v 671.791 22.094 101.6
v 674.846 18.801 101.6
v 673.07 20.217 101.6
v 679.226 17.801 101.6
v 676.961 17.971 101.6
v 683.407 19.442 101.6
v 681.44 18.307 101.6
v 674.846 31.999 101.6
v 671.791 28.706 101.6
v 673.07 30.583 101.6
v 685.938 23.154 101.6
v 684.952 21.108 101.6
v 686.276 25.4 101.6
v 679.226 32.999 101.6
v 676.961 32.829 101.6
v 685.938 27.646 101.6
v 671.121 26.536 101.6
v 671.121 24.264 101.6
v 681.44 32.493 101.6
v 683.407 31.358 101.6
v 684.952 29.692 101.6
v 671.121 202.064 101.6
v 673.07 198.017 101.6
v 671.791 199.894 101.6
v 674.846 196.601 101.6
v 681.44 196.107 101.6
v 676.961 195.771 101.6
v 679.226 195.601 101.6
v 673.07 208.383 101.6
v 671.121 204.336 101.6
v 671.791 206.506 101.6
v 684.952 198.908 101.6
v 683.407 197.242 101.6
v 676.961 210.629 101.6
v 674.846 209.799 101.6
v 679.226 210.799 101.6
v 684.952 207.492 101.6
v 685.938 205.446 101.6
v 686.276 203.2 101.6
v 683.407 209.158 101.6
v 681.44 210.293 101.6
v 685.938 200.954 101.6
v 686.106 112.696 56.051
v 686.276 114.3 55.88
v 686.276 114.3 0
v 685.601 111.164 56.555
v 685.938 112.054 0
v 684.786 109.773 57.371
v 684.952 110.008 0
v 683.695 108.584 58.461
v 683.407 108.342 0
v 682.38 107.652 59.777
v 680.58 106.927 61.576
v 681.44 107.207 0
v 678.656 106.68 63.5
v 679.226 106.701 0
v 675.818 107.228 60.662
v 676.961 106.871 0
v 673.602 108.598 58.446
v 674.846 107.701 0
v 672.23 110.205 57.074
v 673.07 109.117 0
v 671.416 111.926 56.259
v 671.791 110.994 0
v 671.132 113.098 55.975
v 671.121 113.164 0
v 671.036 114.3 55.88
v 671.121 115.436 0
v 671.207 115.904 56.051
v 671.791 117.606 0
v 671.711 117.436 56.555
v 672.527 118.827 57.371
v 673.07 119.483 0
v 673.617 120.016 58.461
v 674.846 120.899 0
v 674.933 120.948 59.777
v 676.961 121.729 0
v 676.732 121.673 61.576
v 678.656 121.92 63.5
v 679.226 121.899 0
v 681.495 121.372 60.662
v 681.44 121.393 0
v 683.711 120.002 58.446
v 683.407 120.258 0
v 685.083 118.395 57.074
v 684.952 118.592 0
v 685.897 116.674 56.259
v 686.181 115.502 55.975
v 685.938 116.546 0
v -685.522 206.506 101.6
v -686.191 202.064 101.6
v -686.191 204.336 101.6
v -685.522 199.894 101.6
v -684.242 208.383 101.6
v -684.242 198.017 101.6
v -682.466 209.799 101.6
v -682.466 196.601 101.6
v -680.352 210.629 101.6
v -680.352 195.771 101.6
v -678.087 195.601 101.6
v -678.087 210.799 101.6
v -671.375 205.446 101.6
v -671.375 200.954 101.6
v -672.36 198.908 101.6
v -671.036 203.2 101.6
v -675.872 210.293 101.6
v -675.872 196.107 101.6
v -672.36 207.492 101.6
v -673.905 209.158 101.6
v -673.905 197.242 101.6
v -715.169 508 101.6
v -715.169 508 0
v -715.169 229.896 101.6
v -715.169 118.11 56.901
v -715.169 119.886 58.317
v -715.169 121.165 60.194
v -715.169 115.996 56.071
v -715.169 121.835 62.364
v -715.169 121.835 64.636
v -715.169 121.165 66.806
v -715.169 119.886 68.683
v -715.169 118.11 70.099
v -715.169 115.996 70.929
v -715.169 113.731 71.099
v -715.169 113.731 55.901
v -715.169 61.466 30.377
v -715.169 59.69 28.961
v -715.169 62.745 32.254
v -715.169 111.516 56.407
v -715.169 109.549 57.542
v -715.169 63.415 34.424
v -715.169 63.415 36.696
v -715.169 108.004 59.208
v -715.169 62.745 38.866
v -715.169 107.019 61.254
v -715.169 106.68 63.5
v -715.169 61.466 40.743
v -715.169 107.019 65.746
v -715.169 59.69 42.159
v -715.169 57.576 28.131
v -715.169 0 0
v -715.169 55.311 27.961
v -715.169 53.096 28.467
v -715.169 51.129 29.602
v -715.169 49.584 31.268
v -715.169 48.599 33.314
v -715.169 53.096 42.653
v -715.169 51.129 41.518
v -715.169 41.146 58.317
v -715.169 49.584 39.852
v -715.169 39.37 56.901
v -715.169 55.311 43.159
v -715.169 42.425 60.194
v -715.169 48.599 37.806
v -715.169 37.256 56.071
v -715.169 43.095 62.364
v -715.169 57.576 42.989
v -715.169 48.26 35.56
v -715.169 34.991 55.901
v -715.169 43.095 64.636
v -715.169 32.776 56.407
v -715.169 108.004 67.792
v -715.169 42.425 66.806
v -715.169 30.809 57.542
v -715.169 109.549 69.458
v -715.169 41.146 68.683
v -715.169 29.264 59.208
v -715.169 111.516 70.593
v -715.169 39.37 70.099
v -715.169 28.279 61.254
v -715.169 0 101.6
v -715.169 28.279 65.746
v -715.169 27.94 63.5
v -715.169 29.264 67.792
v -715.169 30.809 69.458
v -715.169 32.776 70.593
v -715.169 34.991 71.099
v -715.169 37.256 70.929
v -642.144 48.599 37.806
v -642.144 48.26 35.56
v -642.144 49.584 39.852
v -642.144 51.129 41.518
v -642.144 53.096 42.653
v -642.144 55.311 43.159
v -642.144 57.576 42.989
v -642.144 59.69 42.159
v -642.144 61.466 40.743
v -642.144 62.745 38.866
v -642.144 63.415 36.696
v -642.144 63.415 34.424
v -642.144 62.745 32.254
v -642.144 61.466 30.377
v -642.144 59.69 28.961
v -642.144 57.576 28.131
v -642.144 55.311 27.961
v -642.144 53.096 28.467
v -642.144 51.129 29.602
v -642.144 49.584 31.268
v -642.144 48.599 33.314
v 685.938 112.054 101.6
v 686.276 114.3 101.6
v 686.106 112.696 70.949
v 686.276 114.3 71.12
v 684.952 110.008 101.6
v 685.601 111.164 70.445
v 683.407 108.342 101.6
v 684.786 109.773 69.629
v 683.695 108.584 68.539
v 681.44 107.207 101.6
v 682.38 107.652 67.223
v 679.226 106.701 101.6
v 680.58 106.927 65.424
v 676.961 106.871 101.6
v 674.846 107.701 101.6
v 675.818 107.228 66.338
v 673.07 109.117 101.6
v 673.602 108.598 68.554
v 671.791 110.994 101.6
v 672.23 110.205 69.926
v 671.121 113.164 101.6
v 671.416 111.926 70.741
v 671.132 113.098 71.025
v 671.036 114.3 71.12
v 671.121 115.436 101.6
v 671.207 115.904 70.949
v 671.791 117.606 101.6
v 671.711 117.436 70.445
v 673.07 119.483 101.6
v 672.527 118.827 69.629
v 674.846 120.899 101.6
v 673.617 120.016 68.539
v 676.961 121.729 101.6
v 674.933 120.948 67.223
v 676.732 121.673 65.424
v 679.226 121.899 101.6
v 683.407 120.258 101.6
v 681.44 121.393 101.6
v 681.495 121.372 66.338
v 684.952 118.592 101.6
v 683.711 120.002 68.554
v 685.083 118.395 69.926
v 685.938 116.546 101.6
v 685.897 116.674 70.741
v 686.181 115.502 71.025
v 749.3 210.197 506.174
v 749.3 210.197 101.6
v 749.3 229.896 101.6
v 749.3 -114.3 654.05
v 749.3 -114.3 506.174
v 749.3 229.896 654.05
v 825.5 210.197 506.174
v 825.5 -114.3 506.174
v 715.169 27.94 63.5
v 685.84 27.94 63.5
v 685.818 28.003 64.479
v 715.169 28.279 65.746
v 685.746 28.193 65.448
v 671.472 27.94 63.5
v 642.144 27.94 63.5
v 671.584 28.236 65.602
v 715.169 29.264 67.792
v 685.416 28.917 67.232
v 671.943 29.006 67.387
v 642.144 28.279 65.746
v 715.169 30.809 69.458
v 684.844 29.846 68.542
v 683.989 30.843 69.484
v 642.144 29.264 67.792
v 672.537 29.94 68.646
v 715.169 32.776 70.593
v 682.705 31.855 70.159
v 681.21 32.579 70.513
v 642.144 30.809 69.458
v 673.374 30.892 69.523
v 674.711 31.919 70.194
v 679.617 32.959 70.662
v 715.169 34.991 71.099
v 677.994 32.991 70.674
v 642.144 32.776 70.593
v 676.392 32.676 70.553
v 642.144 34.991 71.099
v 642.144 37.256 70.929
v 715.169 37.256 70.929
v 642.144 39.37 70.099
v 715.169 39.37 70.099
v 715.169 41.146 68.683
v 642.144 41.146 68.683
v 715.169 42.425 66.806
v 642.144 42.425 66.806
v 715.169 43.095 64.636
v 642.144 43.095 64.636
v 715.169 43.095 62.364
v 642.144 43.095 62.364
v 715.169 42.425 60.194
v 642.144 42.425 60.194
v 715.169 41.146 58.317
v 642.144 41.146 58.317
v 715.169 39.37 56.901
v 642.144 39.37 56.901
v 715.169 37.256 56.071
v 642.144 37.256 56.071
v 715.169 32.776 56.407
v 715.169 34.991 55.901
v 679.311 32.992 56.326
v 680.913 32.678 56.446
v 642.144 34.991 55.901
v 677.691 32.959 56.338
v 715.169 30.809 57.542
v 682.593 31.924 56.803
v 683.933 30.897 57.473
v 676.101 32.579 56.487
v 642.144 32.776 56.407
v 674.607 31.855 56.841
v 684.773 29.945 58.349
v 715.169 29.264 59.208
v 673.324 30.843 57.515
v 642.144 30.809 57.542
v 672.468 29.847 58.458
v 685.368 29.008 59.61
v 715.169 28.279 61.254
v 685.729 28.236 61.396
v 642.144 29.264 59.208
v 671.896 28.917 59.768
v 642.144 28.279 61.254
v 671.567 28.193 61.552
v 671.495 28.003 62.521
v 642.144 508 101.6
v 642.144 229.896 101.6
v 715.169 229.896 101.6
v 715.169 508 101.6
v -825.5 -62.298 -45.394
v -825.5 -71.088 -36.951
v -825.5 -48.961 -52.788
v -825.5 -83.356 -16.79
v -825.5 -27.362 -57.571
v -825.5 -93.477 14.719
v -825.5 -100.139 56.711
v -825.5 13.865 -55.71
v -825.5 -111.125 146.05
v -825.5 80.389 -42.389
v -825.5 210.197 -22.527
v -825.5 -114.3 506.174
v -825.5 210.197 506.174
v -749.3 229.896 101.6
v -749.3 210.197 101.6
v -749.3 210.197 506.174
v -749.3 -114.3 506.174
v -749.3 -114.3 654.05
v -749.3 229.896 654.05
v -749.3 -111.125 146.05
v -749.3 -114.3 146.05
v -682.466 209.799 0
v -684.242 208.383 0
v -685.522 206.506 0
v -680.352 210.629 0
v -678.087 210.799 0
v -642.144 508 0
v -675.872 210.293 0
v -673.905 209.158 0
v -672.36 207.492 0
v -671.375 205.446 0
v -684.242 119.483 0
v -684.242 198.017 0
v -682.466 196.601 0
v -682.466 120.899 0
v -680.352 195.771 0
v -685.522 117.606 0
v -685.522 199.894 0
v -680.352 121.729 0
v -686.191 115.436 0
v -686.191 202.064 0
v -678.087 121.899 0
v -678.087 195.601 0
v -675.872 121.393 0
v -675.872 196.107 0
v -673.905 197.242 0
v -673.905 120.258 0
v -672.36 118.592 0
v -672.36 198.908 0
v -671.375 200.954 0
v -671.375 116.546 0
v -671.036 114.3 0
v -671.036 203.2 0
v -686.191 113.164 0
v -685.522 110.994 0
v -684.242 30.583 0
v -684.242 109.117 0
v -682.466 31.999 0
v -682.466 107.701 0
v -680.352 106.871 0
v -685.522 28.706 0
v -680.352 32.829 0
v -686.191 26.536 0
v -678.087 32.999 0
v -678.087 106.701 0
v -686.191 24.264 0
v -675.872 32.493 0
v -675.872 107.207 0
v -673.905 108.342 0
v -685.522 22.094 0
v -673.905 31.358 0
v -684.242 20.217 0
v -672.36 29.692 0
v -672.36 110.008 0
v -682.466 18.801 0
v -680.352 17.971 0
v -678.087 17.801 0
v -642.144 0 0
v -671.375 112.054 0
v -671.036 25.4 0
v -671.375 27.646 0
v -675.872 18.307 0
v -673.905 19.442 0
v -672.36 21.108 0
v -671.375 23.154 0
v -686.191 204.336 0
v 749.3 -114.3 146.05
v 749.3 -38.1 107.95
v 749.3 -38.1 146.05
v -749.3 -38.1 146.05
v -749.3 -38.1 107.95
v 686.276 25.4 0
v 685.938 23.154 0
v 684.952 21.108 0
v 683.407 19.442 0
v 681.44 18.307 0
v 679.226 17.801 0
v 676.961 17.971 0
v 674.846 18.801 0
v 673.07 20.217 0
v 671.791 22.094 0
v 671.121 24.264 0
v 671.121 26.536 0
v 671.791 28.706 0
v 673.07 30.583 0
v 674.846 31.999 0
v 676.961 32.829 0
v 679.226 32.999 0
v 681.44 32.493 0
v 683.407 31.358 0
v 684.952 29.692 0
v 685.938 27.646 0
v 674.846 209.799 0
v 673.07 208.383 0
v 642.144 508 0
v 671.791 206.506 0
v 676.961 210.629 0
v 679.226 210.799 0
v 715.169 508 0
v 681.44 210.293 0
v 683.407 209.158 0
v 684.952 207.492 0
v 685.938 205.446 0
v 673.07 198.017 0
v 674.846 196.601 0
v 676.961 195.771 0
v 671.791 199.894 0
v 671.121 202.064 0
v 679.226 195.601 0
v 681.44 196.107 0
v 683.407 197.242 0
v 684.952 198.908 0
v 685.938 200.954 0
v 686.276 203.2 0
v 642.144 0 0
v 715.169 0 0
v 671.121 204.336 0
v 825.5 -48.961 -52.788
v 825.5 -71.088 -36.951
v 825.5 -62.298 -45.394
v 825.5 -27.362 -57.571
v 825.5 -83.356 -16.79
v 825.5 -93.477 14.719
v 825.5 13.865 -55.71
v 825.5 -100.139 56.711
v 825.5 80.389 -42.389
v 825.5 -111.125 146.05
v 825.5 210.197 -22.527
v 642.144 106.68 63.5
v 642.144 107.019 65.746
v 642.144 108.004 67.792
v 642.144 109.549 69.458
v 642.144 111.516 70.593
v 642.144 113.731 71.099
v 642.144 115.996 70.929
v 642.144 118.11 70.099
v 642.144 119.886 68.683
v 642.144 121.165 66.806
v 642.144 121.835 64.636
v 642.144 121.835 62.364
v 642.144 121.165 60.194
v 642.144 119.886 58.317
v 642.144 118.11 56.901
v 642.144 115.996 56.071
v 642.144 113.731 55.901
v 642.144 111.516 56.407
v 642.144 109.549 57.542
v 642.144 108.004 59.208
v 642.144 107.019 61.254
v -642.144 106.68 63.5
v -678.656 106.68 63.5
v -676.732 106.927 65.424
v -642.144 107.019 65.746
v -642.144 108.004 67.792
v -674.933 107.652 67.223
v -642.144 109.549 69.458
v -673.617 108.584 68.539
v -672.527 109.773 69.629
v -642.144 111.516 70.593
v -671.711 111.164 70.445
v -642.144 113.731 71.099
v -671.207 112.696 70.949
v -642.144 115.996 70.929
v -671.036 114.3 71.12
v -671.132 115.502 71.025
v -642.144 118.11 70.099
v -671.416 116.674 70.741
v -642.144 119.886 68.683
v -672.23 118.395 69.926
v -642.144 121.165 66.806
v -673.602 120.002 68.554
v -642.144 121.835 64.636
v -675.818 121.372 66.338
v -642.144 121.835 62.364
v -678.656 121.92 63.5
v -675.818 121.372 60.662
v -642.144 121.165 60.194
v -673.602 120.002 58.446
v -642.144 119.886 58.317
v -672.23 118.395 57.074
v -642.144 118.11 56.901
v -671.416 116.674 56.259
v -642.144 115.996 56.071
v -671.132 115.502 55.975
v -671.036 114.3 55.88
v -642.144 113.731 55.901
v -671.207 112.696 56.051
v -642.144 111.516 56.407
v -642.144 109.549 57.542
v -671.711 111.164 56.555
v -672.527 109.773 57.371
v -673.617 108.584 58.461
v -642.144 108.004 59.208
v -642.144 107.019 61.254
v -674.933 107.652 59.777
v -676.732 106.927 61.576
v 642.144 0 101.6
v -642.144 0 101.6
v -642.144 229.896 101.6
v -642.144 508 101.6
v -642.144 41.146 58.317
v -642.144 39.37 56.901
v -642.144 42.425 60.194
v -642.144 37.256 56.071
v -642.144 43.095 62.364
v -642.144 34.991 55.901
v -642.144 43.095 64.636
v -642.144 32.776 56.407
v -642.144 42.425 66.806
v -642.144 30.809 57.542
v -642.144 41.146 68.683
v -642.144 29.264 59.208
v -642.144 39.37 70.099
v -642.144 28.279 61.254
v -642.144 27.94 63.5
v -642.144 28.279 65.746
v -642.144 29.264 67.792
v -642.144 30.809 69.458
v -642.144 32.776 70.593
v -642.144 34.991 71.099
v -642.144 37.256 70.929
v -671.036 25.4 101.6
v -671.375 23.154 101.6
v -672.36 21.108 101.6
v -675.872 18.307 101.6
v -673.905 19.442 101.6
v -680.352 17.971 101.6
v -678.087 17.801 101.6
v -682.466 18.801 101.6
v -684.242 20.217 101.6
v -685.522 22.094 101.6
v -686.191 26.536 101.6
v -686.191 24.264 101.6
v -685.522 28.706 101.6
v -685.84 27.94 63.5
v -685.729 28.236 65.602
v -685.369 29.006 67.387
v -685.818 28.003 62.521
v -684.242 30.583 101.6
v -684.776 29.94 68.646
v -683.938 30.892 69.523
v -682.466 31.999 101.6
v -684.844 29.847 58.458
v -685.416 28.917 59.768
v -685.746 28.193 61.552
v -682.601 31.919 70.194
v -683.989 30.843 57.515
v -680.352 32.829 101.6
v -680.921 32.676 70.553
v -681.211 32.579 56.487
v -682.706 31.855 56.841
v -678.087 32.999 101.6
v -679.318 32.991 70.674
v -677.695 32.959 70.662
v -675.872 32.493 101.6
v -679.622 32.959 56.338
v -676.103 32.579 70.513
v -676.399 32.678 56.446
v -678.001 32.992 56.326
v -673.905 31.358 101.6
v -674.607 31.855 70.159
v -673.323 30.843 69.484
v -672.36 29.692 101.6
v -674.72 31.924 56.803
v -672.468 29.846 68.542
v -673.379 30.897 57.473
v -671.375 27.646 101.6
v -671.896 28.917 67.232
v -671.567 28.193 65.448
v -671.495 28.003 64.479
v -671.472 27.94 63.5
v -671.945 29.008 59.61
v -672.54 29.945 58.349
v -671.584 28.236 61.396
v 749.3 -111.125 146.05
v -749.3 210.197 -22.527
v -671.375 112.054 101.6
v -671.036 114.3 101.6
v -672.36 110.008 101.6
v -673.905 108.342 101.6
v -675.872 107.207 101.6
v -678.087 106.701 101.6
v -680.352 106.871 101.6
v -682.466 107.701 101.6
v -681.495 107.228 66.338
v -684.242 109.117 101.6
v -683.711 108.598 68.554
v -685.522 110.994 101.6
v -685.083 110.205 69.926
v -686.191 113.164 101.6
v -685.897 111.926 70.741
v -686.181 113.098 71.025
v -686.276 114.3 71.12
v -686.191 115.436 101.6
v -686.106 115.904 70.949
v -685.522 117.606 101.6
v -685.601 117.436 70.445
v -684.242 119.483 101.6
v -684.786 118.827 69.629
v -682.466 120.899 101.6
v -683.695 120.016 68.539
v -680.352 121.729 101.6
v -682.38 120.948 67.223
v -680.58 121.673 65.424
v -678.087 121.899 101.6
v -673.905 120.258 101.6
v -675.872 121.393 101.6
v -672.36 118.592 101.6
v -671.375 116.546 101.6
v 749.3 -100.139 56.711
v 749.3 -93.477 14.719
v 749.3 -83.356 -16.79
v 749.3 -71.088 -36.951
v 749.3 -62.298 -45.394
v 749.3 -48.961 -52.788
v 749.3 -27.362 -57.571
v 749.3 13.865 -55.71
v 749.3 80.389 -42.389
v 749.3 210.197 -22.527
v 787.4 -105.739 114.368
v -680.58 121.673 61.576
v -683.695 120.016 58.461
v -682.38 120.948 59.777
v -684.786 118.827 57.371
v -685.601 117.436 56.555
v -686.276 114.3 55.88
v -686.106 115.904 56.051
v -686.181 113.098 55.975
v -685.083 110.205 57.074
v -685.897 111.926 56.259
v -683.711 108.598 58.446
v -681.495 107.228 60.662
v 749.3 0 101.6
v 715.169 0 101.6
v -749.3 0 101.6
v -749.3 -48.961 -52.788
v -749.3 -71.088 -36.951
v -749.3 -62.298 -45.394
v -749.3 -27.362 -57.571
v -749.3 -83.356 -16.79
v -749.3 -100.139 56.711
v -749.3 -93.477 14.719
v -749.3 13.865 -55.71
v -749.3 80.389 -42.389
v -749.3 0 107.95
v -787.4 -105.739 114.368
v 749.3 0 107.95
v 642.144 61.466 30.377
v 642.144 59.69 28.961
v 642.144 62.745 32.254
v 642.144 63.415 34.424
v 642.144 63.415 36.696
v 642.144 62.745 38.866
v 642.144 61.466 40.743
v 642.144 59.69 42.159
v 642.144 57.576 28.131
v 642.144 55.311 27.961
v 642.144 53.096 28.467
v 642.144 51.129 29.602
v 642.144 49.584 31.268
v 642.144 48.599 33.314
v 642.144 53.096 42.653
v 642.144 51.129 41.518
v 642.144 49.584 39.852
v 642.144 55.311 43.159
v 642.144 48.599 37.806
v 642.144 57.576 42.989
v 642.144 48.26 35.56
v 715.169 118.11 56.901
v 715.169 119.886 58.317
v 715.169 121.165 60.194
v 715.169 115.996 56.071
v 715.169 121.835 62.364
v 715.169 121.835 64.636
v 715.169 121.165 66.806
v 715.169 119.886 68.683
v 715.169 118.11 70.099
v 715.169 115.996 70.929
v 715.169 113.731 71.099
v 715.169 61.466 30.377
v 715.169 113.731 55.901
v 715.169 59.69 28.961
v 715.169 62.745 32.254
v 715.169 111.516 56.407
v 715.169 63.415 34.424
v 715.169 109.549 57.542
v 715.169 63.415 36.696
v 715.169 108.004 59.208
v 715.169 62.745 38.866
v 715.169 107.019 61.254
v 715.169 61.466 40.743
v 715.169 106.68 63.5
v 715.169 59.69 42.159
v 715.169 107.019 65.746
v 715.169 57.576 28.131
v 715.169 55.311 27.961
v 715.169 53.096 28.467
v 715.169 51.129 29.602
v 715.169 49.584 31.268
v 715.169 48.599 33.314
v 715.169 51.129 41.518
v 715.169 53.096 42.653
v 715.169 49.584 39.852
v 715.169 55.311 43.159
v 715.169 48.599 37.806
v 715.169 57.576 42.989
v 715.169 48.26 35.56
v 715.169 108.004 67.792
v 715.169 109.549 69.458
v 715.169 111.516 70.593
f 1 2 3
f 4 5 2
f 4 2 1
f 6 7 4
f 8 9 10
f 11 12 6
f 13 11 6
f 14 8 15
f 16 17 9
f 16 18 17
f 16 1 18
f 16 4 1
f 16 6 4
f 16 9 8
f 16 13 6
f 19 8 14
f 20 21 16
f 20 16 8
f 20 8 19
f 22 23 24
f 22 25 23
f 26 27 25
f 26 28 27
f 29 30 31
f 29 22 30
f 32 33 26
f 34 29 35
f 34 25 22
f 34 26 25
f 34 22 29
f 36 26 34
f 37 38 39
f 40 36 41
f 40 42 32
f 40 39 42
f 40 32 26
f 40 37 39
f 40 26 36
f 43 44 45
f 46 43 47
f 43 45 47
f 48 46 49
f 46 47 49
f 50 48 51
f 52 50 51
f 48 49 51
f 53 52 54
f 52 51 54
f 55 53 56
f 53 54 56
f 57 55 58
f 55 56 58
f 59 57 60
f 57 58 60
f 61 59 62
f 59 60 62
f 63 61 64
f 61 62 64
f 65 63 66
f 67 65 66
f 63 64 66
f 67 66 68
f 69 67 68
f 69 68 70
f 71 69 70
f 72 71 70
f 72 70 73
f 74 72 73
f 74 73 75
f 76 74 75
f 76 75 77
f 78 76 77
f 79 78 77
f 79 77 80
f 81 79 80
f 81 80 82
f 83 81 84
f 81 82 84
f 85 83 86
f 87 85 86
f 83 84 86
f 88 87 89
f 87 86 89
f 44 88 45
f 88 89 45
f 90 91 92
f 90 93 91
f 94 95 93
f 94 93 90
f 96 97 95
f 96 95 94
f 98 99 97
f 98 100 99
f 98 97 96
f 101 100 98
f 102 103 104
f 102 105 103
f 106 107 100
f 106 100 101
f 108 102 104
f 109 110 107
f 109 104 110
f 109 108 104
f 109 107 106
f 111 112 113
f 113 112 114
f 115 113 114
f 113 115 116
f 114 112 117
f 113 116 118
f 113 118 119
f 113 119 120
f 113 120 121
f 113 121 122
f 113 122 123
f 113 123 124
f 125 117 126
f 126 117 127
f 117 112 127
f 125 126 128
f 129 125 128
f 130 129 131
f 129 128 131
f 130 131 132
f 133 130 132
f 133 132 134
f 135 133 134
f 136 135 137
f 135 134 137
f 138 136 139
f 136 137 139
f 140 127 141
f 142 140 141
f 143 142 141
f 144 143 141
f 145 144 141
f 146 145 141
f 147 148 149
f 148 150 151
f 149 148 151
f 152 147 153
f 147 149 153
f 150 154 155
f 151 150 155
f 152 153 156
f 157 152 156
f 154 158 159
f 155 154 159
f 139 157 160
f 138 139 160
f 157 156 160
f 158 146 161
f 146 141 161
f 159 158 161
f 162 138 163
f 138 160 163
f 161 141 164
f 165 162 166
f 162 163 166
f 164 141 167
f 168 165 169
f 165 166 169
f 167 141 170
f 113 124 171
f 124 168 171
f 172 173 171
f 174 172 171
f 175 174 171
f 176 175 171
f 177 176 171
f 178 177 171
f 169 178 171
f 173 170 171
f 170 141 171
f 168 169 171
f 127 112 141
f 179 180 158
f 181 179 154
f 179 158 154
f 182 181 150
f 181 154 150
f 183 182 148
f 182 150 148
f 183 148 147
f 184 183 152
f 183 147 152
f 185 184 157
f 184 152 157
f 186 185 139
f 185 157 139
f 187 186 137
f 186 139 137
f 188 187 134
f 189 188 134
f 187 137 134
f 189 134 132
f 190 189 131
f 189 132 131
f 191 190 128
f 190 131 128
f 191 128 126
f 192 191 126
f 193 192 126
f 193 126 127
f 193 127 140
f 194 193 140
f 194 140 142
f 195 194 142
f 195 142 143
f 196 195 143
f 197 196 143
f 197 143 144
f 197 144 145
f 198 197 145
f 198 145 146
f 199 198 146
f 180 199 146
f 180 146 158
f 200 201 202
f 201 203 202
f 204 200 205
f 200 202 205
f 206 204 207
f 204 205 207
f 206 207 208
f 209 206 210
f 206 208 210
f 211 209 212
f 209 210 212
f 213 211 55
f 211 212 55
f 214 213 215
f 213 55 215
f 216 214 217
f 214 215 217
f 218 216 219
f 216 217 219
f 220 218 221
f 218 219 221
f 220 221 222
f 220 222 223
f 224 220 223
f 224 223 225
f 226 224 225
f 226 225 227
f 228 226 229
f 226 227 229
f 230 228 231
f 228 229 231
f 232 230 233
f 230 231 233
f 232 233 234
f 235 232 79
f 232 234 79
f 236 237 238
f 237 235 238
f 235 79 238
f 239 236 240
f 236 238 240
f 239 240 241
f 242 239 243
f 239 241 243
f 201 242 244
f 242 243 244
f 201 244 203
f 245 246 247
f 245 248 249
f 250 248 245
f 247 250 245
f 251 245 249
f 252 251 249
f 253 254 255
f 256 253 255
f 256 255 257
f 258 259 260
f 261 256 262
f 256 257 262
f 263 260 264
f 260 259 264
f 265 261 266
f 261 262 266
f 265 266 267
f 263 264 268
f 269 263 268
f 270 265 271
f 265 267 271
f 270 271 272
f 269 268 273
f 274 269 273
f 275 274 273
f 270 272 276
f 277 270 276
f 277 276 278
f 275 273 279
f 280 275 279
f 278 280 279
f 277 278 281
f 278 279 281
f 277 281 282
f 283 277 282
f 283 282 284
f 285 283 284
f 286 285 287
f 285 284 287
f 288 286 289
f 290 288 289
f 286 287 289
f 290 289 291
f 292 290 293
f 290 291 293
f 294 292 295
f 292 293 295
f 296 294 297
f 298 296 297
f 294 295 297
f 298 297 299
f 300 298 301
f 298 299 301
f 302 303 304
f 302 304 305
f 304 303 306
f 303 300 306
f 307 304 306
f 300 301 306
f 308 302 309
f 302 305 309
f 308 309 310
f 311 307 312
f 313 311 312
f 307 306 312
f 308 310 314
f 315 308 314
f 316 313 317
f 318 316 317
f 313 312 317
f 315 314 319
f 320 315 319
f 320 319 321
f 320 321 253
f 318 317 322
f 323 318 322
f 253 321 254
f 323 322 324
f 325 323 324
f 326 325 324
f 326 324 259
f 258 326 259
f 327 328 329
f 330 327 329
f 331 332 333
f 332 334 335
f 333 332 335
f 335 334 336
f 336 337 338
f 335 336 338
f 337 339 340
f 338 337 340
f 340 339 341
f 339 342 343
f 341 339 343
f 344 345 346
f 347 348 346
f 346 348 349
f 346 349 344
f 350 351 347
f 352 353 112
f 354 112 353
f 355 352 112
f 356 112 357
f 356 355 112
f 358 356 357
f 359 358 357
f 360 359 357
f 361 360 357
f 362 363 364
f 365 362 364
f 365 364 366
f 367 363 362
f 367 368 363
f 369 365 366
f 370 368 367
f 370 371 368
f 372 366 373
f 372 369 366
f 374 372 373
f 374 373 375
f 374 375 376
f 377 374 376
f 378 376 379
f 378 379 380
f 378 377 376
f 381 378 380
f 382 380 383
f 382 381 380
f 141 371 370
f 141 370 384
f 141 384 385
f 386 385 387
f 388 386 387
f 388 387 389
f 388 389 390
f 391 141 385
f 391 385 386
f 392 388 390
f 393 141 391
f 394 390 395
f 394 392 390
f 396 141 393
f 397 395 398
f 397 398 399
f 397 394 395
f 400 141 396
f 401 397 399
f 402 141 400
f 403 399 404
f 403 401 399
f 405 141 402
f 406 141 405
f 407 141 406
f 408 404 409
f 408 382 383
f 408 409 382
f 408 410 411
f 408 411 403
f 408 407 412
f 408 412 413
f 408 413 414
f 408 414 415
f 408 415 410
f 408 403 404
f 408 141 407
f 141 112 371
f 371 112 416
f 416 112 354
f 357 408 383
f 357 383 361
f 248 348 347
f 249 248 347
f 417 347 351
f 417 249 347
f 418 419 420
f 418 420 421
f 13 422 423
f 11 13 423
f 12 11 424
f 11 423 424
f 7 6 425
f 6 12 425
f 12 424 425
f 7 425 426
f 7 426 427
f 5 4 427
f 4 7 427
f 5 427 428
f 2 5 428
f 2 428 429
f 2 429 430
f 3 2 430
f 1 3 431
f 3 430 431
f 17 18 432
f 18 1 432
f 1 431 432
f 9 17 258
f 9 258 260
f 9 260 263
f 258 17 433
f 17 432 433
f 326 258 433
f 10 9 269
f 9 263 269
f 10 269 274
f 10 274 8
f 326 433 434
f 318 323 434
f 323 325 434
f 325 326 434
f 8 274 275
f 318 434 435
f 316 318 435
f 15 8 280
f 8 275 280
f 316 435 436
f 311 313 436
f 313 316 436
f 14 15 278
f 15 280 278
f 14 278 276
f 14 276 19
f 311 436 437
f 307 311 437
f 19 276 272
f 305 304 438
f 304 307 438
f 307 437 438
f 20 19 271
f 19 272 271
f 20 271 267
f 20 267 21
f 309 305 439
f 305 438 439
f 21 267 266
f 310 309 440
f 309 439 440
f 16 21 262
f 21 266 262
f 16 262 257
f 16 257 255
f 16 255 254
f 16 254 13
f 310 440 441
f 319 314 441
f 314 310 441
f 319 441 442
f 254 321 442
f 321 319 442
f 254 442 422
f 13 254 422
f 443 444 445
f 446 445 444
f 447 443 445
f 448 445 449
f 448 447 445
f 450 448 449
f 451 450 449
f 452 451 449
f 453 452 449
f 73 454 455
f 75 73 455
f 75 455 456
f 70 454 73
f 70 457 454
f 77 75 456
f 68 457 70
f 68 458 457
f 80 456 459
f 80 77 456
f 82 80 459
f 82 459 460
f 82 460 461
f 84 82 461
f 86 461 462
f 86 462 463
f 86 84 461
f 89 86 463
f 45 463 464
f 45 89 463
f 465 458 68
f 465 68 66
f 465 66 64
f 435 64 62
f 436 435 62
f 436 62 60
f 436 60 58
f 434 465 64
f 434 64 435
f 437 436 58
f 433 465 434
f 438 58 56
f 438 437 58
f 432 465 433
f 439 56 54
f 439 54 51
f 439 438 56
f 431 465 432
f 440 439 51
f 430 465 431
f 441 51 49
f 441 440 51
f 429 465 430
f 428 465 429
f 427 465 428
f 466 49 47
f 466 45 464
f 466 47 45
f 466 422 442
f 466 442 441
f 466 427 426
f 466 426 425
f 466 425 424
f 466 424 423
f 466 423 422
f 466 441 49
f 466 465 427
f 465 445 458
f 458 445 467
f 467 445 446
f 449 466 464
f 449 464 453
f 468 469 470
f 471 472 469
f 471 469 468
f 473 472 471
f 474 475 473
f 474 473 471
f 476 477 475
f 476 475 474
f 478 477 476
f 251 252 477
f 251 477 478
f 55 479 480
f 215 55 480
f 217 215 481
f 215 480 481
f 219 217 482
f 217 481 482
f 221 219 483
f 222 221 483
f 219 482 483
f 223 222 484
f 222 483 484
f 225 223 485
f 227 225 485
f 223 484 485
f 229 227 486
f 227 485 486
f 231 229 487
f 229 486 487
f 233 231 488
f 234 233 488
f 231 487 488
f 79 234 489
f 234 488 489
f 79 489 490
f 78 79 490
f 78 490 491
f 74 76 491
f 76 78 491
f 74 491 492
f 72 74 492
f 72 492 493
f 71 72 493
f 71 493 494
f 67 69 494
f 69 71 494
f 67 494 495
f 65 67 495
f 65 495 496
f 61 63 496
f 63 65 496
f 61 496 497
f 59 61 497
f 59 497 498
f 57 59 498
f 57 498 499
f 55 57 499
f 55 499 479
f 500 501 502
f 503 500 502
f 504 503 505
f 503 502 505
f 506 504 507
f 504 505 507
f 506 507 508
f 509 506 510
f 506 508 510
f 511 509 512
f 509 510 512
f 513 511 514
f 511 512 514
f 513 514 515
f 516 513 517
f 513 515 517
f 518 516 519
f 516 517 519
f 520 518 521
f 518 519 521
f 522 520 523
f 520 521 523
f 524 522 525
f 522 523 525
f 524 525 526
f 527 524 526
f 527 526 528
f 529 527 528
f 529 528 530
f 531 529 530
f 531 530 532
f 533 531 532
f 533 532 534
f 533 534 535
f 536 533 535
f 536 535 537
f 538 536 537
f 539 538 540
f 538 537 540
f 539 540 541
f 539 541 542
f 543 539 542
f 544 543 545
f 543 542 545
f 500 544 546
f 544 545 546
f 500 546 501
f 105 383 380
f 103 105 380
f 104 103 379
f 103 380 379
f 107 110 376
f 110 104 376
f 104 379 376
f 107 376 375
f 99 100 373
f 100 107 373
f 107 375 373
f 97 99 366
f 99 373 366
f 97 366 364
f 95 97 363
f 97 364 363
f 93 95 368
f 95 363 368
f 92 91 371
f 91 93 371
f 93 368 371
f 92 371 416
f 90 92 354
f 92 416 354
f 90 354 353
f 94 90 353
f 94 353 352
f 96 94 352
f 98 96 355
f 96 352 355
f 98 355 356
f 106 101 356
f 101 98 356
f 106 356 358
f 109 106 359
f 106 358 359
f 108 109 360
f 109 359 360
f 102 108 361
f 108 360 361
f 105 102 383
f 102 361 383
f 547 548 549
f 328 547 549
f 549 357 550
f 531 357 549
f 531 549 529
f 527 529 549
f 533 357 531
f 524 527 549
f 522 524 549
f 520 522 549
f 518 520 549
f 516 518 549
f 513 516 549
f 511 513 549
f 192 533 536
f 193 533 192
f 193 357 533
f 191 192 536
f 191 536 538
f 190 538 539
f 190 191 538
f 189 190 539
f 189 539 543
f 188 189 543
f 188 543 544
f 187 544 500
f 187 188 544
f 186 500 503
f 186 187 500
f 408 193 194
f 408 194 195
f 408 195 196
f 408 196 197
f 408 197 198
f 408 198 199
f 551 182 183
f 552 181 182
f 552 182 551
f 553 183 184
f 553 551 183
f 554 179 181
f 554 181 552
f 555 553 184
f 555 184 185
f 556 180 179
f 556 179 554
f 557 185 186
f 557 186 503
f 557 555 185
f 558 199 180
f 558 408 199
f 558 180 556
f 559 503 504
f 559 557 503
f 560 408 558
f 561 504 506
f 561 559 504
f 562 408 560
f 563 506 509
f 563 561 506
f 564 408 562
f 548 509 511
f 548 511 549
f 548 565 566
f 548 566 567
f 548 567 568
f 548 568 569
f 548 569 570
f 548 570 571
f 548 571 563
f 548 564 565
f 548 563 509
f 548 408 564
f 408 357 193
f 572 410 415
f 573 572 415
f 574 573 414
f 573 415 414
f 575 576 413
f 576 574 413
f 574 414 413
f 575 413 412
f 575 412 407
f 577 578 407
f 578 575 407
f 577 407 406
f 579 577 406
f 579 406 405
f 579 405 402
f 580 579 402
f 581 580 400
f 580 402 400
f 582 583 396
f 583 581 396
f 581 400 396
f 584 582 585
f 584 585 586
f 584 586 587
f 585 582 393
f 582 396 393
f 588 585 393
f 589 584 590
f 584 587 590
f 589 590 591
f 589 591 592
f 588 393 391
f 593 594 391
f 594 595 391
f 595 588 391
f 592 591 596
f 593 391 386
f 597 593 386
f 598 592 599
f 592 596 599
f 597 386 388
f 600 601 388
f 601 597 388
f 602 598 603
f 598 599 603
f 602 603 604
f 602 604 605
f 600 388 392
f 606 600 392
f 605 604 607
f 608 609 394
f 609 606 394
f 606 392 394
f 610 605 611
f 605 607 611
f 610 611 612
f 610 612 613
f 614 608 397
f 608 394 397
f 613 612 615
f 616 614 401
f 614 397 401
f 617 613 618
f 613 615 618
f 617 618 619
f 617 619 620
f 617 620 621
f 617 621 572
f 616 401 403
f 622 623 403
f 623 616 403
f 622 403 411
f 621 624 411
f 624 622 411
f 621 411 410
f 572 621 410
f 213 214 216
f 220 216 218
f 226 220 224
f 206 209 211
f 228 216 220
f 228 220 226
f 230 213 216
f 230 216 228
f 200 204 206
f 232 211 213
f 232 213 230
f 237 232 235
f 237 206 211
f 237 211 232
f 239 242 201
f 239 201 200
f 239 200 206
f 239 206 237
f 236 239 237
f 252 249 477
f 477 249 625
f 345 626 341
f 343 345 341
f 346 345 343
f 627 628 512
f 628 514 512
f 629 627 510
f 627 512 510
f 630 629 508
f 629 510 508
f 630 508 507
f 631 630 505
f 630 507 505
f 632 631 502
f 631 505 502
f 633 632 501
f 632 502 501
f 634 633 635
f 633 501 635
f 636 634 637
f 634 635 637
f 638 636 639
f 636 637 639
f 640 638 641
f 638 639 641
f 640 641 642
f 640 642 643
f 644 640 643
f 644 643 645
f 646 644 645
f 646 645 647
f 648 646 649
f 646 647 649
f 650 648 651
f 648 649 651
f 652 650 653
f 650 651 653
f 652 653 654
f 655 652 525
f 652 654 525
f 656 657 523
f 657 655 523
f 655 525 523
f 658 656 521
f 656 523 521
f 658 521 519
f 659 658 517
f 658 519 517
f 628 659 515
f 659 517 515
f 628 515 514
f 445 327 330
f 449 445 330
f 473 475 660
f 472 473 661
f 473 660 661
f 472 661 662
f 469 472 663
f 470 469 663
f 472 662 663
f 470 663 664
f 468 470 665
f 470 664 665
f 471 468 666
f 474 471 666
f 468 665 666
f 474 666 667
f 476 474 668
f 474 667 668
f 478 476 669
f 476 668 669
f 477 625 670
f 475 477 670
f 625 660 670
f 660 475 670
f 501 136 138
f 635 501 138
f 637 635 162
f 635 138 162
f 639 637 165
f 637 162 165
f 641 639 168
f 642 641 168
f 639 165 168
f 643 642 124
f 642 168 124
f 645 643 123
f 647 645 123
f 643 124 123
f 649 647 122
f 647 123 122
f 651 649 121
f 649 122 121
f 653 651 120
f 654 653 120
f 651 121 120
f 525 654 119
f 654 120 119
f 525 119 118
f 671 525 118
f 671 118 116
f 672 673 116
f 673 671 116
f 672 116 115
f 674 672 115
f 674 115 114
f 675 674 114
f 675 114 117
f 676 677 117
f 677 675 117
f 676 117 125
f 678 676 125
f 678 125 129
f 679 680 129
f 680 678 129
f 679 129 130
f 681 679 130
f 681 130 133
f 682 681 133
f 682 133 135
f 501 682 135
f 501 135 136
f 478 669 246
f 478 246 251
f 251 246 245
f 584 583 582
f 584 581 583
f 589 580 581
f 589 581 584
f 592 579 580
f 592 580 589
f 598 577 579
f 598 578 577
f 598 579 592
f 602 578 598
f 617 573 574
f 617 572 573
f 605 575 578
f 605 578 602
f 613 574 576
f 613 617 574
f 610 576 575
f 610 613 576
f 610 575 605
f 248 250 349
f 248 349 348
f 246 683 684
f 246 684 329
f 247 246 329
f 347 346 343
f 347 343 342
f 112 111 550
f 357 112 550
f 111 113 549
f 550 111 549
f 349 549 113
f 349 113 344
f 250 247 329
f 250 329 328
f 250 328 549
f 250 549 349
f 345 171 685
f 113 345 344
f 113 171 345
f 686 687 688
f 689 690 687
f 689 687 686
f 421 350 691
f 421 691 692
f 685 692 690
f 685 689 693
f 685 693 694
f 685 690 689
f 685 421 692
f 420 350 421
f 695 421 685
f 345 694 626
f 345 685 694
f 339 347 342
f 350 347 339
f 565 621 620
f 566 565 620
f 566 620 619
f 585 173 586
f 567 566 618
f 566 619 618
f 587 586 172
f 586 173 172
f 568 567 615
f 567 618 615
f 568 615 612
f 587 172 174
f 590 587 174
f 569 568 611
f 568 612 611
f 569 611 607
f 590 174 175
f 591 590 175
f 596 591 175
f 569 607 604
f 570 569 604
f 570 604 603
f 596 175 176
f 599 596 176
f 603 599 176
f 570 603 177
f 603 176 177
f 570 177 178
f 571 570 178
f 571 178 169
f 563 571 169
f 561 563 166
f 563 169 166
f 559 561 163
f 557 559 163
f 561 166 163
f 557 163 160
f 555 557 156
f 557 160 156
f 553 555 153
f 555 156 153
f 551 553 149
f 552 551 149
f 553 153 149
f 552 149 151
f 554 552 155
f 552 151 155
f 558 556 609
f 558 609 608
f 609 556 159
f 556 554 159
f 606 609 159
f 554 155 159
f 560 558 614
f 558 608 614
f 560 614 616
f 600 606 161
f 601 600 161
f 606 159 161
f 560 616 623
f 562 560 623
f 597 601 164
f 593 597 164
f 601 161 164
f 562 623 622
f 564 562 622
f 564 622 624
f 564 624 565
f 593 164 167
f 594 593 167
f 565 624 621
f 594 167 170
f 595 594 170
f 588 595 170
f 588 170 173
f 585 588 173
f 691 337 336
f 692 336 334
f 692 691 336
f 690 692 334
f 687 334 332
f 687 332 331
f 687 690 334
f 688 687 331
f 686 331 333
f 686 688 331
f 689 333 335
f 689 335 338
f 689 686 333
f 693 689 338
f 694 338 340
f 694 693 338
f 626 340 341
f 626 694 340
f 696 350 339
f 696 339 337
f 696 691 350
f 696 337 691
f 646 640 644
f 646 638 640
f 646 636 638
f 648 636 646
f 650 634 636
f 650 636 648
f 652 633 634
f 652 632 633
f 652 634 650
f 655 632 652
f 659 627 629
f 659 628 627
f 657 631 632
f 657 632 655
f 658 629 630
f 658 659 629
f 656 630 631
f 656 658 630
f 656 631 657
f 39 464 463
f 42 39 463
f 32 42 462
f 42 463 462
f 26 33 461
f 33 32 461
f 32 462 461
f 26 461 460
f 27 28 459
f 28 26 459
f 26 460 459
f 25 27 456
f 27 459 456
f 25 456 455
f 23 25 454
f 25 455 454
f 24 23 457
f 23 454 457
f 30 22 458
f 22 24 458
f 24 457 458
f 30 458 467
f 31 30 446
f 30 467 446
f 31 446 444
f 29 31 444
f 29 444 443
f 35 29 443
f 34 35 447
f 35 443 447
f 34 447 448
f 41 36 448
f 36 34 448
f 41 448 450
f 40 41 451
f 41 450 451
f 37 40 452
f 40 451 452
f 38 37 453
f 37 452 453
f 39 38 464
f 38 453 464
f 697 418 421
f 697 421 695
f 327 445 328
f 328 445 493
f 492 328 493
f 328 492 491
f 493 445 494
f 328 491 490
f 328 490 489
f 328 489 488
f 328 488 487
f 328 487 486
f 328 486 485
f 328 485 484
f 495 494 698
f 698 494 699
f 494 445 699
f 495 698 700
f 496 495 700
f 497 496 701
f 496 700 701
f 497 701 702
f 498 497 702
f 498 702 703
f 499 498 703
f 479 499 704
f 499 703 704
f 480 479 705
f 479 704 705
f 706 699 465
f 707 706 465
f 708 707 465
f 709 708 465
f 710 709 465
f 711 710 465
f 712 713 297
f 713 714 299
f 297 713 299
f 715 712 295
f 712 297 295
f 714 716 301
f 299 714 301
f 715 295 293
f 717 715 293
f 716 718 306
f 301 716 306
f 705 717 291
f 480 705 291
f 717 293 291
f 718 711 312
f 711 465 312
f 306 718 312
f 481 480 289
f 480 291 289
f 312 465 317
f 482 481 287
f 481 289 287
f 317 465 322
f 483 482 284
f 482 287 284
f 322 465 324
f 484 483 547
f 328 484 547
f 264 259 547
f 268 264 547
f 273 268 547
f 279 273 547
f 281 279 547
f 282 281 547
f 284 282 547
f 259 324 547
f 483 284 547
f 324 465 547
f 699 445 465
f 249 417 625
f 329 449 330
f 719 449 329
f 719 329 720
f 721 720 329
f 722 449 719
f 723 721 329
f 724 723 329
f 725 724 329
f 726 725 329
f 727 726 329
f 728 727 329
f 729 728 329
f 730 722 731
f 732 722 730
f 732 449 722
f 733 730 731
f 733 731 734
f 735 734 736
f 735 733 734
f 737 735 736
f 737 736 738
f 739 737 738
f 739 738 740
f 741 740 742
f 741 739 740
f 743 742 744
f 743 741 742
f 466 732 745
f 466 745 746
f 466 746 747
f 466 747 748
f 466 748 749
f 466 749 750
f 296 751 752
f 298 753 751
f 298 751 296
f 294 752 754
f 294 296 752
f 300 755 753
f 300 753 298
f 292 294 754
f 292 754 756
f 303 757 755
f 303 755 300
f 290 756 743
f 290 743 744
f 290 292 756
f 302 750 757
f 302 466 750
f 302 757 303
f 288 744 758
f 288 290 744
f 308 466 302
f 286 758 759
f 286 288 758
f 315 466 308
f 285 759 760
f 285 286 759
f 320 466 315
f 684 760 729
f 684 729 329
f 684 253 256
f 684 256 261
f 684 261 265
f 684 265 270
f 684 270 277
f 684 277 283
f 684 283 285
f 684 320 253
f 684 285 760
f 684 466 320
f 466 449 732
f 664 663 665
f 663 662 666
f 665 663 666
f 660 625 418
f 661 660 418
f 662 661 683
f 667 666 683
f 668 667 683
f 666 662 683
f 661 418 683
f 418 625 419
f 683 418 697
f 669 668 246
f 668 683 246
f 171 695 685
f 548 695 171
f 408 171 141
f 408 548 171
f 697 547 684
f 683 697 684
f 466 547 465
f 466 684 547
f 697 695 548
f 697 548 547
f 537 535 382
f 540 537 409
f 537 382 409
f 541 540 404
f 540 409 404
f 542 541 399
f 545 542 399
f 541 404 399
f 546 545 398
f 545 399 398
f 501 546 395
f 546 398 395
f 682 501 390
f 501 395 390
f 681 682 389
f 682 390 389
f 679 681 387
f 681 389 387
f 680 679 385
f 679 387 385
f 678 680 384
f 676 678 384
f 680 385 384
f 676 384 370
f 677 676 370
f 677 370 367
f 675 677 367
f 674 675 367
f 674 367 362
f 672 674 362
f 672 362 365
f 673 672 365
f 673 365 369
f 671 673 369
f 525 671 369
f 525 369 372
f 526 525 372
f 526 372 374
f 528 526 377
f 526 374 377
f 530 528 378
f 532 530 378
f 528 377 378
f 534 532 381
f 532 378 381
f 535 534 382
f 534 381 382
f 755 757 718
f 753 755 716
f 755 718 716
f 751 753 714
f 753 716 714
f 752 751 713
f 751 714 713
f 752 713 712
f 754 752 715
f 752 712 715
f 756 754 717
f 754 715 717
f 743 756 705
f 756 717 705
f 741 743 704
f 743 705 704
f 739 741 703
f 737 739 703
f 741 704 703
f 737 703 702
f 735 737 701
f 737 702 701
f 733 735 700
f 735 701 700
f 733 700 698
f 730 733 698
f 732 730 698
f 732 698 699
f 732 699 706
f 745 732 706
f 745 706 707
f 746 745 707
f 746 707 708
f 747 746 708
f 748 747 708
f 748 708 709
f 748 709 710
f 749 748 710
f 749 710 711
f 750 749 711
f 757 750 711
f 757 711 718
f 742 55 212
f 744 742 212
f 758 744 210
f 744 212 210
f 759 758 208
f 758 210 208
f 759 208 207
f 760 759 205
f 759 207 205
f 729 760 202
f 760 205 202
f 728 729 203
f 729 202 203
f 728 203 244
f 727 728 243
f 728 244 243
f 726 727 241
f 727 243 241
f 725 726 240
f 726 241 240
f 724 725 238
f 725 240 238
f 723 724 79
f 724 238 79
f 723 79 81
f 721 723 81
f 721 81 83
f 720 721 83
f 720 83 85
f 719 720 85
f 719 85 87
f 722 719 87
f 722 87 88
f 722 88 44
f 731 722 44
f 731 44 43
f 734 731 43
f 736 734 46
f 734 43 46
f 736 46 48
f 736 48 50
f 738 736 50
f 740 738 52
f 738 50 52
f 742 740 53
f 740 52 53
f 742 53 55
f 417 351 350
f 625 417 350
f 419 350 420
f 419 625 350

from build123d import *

# Parameters (mm, degrees)
F0_W      = 73.025
F0_H      = 101.6
F1_DEPTH  = 508
F2_R      = 7.62
F3_DEPTH  = 101.601
F4_R      = 7.62
F5_DEPTH  = 1430.3385
F8_DEPTH  = 1498.6
F10_DEPTH = 76.2


with BuildPart() as f1:
    # F0 (on Front) → F1 (new body)
    with BuildSketch(Plane.XZ):
        with Locations((-678.65625, 50.8)):
            Rectangle(F0_W, F0_H)
    extrude(amount=-F1_DEPTH)


with BuildPart() as f1b:
    # F0 (on Front) → F1, piece 2 (new body)
    with BuildSketch(Plane.XZ):
        with Locations((678.65625, 50.8)):
            Rectangle(F0_W, F0_H)
    extrude(amount=-F1_DEPTH)


with BuildPart() as f3_tool:
    # F2 (on face) → F3 (new body, through all)
    with BuildSketch(Plane(origin=(0, 0, 0), x_dir=(1, 0, 0), z_dir=(0, 0, -1))):
        with Locations((-678.65625, -25.4)):
            Circle(F2_R)
        with Locations((-678.65625, -114.3)):
            Circle(F2_R)
        with Locations((-678.65625, -203.2)):
            Circle(F2_R)
        with Locations((678.65625, -25.4)):
            Circle(F2_R)
        with Locations((678.65625, -114.3)):
            Circle(F2_R)
        with Locations((678.65625, -203.2)):
            Circle(F2_R)
    extrude(amount=-F3_DEPTH)


with BuildPart() as f1_1:
    add(f1.part)

    # F3: cut by f3_tool
    add(f3_tool.part, mode=Mode.SUBTRACT)


with BuildPart() as f1b_1:
    add(f1b.part)

    # F3: cut by f3_tool
    add(f3_tool.part, mode=Mode.SUBTRACT)


with BuildPart() as f5_tool:
    # F4 (on face) → F5 (new body, through all)
    with BuildSketch(Plane(origin=(-715.16875, 0, 0), x_dir=(0, -1, 0), z_dir=(-1, 0, 0))):
        with Locations((-114.3, 63.5)):
            Circle(F4_R)
        with Locations((-55.88, 35.56)):
            Circle(F4_R)
        with Locations((-35.56, 63.5)):
            Circle(F4_R)
    extrude(amount=-F5_DEPTH)


with BuildPart() as f1_2:
    add(f1_1.part)

    # F5: cut by f5_tool
    add(f5_tool.part, mode=Mode.SUBTRACT)



with BuildPart() as f1b_2:
    add(f1b_1.part)

    # F5: cut by f5_tool
    add(f5_tool.part, mode=Mode.SUBTRACT)


with BuildPart() as f1_3:
    add(f1_2.part)

    add(f1b_2.part)  # F8 merges F1b
    # F7 (on offset) → F8 (join)
    with BuildSketch(Plane.YZ.offset(749.3)):
        Polygon((-38.1, 107.95), (0, 107.95), (0, 101.6), (229.8964709044, 101.6), (229.8964709044, 654.05), (-114.3, 654.05), (-114.3, 146.05), (-38.1, 146.05), align=None)
    extrude(amount=-F8_DEPTH)

    # F9 (on face) → F10 (join)
    with BuildSketch(Plane.YZ.offset(749.3)):
        Polygon((-114.3, 506.1743855476), (-111.125, 146.05), (-38.1, 146.05), (-38.1, 107.95), (0, 107.95), (0, 101.6), (210.1973444223, 101.6), (210.1973444223, 506.1743855476), align=None)
        with BuildLine():
            Line((-38.1, 146.05), (-111.125, 146.05))
            add(Edge.make_bspline(
                [(-111.125, 146.05), (-110.1389825344, 127.9860138893), (-100.2988577604, 117.881006452), (-101.5214413042, -130.5658881024), (101.1466756463, -23.6625690013), (210.1973444223, -22.5266236812)],
                knots=[0, 0, 0, 0, 0.1758084358, 0.5312599023, 1, 1, 1, 1], degree=3))
            Line((210.1973444223, -22.5266236812), (210.1973444223, 101.6))
            Line((210.1973444223, 101.6), (0, 101.6))
            Line((0, 101.6), (0, 107.95))
            Line((0, 107.95), (-38.1, 107.95))
            Line((-38.1, 107.95), (-38.1, 146.05))
        make_face()
    extrude(amount=F10_DEPTH)

    # F11: F1 across plane


with BuildPart() as f1_4:
    add(f1_3.part)
    add(f1_3.part.mirror(Plane.YZ))


solid = f1_4.part
